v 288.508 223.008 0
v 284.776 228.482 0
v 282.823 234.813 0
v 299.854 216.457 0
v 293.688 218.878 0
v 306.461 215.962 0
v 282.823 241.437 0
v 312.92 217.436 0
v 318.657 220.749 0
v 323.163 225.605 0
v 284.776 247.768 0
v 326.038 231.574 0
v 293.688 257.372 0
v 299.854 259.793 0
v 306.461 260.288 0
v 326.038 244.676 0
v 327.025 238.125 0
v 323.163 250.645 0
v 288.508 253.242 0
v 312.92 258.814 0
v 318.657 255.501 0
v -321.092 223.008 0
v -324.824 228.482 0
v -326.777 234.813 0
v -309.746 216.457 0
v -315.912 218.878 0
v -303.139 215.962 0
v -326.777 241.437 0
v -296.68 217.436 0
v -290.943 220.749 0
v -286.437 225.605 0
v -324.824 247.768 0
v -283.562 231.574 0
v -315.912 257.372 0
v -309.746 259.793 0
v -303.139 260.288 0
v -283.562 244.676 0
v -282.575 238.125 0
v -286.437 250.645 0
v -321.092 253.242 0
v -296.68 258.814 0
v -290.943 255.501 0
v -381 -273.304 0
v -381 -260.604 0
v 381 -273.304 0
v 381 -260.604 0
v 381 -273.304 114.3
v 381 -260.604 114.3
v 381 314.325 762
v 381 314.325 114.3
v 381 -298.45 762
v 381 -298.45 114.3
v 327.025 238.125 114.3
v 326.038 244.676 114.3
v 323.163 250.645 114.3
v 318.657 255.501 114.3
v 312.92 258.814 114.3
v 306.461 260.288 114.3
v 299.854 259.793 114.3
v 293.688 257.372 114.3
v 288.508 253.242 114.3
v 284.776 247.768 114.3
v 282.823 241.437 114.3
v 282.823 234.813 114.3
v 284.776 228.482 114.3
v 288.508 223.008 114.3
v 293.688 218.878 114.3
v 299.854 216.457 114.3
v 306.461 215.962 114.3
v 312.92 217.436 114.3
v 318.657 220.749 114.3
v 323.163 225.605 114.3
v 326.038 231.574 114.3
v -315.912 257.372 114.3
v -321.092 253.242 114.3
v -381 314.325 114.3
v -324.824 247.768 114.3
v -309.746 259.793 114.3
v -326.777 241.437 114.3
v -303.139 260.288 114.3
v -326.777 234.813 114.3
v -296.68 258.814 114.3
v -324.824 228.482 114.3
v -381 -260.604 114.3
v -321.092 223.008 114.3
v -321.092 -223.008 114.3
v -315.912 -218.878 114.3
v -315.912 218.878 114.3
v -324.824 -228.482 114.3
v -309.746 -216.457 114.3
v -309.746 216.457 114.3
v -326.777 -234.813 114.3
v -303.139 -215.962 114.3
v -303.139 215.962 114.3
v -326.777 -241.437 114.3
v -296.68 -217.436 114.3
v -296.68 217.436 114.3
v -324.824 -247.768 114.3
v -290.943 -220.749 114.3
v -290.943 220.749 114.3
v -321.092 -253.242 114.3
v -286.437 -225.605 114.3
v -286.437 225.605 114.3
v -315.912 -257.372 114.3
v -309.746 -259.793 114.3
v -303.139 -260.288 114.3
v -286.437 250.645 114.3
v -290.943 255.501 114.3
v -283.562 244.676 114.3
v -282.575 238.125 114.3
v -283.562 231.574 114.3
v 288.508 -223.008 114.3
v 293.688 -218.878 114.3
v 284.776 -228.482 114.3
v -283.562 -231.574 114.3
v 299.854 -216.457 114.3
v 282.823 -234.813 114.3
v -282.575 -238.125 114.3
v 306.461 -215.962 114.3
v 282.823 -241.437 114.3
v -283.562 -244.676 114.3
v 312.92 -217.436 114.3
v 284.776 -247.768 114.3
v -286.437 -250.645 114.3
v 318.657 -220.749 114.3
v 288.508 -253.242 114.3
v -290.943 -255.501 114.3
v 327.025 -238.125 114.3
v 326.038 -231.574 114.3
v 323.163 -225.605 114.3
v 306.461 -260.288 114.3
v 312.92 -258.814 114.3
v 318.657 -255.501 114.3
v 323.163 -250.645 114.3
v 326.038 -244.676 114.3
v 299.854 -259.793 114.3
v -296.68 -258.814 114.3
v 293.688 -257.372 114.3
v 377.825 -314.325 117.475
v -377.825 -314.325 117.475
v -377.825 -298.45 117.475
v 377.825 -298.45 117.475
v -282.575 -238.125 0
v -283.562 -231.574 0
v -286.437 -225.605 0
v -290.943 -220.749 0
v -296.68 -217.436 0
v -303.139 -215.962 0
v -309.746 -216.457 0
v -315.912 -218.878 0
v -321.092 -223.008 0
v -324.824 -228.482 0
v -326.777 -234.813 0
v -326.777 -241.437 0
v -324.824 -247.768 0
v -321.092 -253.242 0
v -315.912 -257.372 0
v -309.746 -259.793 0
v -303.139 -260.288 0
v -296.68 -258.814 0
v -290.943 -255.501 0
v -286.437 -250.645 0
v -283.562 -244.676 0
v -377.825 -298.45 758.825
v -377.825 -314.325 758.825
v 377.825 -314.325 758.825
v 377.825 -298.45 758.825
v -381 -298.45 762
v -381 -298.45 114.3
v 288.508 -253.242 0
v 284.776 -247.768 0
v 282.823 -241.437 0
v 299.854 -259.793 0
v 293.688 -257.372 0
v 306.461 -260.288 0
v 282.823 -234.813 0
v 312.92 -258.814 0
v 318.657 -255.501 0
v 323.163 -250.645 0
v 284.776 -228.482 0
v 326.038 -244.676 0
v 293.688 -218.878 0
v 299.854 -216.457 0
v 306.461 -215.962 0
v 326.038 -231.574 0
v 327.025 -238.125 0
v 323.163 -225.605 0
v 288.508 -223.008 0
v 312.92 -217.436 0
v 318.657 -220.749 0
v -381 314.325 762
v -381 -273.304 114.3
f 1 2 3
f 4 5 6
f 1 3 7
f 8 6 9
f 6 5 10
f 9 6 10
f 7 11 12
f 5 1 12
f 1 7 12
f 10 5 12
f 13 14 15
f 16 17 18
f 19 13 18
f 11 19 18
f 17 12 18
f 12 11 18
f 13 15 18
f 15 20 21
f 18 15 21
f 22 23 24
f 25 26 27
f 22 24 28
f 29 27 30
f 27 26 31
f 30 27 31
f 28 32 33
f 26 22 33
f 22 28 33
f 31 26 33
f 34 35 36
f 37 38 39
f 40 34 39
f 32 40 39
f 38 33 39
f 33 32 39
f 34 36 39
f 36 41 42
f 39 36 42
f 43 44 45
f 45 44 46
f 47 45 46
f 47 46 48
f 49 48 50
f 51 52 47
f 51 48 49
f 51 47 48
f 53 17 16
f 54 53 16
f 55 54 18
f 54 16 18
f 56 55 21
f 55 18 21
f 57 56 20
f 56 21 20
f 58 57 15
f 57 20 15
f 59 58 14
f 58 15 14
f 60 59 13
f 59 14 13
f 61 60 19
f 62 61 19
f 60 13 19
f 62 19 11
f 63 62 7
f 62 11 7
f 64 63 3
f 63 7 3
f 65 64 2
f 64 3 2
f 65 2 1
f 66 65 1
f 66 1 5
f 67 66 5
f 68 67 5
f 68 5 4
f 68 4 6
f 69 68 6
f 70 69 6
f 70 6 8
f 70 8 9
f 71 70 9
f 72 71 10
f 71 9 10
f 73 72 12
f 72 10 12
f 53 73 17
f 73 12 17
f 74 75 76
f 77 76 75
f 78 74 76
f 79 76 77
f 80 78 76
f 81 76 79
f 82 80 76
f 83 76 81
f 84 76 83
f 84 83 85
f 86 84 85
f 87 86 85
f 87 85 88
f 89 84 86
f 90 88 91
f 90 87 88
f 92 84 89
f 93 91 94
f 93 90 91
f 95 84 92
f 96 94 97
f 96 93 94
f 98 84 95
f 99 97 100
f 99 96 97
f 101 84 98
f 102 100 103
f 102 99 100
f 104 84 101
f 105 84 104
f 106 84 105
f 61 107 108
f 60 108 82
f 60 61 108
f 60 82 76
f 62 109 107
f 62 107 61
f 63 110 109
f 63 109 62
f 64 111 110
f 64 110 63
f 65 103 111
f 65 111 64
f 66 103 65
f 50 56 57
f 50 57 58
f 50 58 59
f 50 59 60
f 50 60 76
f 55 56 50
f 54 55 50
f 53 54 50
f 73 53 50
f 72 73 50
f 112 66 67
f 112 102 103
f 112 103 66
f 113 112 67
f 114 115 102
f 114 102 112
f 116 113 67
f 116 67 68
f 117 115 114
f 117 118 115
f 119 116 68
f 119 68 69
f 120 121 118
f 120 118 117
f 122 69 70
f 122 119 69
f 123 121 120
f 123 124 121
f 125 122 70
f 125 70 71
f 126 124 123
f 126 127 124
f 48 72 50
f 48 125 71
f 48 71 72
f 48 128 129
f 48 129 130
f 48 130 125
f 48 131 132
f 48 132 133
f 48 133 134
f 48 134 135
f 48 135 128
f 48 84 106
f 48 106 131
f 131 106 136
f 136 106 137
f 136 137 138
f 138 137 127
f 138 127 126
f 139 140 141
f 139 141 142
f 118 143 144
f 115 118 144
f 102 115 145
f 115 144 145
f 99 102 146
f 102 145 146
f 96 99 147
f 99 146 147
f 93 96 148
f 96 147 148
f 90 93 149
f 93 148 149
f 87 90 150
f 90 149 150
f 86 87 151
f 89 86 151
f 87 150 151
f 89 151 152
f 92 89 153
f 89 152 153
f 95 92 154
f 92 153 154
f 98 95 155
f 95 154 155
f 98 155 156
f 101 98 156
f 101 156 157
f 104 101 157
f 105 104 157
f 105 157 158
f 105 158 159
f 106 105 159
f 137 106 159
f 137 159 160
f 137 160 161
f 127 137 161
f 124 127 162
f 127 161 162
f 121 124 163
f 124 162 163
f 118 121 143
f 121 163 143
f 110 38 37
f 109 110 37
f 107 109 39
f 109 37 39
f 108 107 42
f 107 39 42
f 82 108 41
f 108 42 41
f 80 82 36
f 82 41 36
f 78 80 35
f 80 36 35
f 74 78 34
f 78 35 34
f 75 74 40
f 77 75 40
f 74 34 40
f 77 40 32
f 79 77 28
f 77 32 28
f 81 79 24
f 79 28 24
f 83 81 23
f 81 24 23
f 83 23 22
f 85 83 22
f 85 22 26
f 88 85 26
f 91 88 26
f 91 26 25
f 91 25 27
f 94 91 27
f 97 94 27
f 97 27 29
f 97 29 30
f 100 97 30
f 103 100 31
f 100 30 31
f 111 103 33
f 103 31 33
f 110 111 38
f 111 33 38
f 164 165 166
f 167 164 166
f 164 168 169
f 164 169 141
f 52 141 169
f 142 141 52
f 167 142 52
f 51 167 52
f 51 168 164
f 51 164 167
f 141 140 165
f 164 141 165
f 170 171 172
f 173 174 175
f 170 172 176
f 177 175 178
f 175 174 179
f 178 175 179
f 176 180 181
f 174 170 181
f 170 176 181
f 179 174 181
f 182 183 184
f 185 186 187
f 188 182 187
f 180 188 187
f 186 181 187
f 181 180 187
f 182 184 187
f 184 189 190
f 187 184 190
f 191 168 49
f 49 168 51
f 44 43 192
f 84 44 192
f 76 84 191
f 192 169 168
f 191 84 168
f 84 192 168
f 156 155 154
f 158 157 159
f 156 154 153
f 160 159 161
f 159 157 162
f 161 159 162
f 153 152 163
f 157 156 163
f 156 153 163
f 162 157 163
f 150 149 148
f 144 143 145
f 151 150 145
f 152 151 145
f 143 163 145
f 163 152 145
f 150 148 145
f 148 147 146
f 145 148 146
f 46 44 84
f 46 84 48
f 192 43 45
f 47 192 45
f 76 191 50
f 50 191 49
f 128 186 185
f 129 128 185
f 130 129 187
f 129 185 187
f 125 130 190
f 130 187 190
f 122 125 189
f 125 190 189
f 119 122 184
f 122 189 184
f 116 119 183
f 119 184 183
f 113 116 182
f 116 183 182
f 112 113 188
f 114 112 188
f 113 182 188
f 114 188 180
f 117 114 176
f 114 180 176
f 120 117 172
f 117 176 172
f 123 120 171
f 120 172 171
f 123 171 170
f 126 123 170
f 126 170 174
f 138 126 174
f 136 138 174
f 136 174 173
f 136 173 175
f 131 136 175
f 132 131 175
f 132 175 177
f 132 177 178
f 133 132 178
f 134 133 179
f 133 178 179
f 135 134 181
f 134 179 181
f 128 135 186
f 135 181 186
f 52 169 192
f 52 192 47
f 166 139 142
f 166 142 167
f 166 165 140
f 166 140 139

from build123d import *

# Parameters (mm, degrees)
F0_W     = 762
F0_H     = 647.7
F1_DEPTH = 314.325
F2_R     = 22.225
F3_DEPTH = 114.3
F4_W     = 762
F4_H     = 12.7
F5_DEPTH = 114.3
F6_W     = 762
F6_H     = 647.7
F6_W_2   = 755.65
F6_H_2   = 641.35
F7_DEPTH = 15.875


with BuildPart() as f1:
    # F0 (on Front) → F1 (new body, symmetric)
    with BuildSketch(Plane.XZ):
        with Locations((0, 438.15)):
            Rectangle(F0_W, F0_H)
    extrude(amount=F1_DEPTH, both=True)

    # F2 (on Top) → F3 (join)
    with BuildSketch(Plane.XY):
        with Locations((-304.8, -238.125)):
            Circle(F2_R)
        with Locations((304.8, -238.125)):
            Circle(F2_R)
        with Locations((304.8, 238.125)):
            Circle(F2_R)
        with Locations((-304.8, 238.125)):
            Circle(F2_R)
    extrude(amount=F3_DEPTH)

    # F4 (on Top) → F5 (join, through all)
    with BuildSketch(Plane.XY):
        with Locations((0, -266.954)):
            Rectangle(F4_W, F4_H)
    extrude(amount=F5_DEPTH)

    # F6 (on face) → F7 (cut)
    with BuildSketch(Plane.XZ.offset(314.325)):
        with Locations((0, 438.15)):
            Rectangle(F6_W, F6_H)
        with Locations((0, 438.15)):
            Rectangle(F6_W_2, F6_H_2, mode=Mode.SUBTRACT)
    extrude(amount=-F7_DEPTH, mode=Mode.SUBTRACT)


solid = f1.part
